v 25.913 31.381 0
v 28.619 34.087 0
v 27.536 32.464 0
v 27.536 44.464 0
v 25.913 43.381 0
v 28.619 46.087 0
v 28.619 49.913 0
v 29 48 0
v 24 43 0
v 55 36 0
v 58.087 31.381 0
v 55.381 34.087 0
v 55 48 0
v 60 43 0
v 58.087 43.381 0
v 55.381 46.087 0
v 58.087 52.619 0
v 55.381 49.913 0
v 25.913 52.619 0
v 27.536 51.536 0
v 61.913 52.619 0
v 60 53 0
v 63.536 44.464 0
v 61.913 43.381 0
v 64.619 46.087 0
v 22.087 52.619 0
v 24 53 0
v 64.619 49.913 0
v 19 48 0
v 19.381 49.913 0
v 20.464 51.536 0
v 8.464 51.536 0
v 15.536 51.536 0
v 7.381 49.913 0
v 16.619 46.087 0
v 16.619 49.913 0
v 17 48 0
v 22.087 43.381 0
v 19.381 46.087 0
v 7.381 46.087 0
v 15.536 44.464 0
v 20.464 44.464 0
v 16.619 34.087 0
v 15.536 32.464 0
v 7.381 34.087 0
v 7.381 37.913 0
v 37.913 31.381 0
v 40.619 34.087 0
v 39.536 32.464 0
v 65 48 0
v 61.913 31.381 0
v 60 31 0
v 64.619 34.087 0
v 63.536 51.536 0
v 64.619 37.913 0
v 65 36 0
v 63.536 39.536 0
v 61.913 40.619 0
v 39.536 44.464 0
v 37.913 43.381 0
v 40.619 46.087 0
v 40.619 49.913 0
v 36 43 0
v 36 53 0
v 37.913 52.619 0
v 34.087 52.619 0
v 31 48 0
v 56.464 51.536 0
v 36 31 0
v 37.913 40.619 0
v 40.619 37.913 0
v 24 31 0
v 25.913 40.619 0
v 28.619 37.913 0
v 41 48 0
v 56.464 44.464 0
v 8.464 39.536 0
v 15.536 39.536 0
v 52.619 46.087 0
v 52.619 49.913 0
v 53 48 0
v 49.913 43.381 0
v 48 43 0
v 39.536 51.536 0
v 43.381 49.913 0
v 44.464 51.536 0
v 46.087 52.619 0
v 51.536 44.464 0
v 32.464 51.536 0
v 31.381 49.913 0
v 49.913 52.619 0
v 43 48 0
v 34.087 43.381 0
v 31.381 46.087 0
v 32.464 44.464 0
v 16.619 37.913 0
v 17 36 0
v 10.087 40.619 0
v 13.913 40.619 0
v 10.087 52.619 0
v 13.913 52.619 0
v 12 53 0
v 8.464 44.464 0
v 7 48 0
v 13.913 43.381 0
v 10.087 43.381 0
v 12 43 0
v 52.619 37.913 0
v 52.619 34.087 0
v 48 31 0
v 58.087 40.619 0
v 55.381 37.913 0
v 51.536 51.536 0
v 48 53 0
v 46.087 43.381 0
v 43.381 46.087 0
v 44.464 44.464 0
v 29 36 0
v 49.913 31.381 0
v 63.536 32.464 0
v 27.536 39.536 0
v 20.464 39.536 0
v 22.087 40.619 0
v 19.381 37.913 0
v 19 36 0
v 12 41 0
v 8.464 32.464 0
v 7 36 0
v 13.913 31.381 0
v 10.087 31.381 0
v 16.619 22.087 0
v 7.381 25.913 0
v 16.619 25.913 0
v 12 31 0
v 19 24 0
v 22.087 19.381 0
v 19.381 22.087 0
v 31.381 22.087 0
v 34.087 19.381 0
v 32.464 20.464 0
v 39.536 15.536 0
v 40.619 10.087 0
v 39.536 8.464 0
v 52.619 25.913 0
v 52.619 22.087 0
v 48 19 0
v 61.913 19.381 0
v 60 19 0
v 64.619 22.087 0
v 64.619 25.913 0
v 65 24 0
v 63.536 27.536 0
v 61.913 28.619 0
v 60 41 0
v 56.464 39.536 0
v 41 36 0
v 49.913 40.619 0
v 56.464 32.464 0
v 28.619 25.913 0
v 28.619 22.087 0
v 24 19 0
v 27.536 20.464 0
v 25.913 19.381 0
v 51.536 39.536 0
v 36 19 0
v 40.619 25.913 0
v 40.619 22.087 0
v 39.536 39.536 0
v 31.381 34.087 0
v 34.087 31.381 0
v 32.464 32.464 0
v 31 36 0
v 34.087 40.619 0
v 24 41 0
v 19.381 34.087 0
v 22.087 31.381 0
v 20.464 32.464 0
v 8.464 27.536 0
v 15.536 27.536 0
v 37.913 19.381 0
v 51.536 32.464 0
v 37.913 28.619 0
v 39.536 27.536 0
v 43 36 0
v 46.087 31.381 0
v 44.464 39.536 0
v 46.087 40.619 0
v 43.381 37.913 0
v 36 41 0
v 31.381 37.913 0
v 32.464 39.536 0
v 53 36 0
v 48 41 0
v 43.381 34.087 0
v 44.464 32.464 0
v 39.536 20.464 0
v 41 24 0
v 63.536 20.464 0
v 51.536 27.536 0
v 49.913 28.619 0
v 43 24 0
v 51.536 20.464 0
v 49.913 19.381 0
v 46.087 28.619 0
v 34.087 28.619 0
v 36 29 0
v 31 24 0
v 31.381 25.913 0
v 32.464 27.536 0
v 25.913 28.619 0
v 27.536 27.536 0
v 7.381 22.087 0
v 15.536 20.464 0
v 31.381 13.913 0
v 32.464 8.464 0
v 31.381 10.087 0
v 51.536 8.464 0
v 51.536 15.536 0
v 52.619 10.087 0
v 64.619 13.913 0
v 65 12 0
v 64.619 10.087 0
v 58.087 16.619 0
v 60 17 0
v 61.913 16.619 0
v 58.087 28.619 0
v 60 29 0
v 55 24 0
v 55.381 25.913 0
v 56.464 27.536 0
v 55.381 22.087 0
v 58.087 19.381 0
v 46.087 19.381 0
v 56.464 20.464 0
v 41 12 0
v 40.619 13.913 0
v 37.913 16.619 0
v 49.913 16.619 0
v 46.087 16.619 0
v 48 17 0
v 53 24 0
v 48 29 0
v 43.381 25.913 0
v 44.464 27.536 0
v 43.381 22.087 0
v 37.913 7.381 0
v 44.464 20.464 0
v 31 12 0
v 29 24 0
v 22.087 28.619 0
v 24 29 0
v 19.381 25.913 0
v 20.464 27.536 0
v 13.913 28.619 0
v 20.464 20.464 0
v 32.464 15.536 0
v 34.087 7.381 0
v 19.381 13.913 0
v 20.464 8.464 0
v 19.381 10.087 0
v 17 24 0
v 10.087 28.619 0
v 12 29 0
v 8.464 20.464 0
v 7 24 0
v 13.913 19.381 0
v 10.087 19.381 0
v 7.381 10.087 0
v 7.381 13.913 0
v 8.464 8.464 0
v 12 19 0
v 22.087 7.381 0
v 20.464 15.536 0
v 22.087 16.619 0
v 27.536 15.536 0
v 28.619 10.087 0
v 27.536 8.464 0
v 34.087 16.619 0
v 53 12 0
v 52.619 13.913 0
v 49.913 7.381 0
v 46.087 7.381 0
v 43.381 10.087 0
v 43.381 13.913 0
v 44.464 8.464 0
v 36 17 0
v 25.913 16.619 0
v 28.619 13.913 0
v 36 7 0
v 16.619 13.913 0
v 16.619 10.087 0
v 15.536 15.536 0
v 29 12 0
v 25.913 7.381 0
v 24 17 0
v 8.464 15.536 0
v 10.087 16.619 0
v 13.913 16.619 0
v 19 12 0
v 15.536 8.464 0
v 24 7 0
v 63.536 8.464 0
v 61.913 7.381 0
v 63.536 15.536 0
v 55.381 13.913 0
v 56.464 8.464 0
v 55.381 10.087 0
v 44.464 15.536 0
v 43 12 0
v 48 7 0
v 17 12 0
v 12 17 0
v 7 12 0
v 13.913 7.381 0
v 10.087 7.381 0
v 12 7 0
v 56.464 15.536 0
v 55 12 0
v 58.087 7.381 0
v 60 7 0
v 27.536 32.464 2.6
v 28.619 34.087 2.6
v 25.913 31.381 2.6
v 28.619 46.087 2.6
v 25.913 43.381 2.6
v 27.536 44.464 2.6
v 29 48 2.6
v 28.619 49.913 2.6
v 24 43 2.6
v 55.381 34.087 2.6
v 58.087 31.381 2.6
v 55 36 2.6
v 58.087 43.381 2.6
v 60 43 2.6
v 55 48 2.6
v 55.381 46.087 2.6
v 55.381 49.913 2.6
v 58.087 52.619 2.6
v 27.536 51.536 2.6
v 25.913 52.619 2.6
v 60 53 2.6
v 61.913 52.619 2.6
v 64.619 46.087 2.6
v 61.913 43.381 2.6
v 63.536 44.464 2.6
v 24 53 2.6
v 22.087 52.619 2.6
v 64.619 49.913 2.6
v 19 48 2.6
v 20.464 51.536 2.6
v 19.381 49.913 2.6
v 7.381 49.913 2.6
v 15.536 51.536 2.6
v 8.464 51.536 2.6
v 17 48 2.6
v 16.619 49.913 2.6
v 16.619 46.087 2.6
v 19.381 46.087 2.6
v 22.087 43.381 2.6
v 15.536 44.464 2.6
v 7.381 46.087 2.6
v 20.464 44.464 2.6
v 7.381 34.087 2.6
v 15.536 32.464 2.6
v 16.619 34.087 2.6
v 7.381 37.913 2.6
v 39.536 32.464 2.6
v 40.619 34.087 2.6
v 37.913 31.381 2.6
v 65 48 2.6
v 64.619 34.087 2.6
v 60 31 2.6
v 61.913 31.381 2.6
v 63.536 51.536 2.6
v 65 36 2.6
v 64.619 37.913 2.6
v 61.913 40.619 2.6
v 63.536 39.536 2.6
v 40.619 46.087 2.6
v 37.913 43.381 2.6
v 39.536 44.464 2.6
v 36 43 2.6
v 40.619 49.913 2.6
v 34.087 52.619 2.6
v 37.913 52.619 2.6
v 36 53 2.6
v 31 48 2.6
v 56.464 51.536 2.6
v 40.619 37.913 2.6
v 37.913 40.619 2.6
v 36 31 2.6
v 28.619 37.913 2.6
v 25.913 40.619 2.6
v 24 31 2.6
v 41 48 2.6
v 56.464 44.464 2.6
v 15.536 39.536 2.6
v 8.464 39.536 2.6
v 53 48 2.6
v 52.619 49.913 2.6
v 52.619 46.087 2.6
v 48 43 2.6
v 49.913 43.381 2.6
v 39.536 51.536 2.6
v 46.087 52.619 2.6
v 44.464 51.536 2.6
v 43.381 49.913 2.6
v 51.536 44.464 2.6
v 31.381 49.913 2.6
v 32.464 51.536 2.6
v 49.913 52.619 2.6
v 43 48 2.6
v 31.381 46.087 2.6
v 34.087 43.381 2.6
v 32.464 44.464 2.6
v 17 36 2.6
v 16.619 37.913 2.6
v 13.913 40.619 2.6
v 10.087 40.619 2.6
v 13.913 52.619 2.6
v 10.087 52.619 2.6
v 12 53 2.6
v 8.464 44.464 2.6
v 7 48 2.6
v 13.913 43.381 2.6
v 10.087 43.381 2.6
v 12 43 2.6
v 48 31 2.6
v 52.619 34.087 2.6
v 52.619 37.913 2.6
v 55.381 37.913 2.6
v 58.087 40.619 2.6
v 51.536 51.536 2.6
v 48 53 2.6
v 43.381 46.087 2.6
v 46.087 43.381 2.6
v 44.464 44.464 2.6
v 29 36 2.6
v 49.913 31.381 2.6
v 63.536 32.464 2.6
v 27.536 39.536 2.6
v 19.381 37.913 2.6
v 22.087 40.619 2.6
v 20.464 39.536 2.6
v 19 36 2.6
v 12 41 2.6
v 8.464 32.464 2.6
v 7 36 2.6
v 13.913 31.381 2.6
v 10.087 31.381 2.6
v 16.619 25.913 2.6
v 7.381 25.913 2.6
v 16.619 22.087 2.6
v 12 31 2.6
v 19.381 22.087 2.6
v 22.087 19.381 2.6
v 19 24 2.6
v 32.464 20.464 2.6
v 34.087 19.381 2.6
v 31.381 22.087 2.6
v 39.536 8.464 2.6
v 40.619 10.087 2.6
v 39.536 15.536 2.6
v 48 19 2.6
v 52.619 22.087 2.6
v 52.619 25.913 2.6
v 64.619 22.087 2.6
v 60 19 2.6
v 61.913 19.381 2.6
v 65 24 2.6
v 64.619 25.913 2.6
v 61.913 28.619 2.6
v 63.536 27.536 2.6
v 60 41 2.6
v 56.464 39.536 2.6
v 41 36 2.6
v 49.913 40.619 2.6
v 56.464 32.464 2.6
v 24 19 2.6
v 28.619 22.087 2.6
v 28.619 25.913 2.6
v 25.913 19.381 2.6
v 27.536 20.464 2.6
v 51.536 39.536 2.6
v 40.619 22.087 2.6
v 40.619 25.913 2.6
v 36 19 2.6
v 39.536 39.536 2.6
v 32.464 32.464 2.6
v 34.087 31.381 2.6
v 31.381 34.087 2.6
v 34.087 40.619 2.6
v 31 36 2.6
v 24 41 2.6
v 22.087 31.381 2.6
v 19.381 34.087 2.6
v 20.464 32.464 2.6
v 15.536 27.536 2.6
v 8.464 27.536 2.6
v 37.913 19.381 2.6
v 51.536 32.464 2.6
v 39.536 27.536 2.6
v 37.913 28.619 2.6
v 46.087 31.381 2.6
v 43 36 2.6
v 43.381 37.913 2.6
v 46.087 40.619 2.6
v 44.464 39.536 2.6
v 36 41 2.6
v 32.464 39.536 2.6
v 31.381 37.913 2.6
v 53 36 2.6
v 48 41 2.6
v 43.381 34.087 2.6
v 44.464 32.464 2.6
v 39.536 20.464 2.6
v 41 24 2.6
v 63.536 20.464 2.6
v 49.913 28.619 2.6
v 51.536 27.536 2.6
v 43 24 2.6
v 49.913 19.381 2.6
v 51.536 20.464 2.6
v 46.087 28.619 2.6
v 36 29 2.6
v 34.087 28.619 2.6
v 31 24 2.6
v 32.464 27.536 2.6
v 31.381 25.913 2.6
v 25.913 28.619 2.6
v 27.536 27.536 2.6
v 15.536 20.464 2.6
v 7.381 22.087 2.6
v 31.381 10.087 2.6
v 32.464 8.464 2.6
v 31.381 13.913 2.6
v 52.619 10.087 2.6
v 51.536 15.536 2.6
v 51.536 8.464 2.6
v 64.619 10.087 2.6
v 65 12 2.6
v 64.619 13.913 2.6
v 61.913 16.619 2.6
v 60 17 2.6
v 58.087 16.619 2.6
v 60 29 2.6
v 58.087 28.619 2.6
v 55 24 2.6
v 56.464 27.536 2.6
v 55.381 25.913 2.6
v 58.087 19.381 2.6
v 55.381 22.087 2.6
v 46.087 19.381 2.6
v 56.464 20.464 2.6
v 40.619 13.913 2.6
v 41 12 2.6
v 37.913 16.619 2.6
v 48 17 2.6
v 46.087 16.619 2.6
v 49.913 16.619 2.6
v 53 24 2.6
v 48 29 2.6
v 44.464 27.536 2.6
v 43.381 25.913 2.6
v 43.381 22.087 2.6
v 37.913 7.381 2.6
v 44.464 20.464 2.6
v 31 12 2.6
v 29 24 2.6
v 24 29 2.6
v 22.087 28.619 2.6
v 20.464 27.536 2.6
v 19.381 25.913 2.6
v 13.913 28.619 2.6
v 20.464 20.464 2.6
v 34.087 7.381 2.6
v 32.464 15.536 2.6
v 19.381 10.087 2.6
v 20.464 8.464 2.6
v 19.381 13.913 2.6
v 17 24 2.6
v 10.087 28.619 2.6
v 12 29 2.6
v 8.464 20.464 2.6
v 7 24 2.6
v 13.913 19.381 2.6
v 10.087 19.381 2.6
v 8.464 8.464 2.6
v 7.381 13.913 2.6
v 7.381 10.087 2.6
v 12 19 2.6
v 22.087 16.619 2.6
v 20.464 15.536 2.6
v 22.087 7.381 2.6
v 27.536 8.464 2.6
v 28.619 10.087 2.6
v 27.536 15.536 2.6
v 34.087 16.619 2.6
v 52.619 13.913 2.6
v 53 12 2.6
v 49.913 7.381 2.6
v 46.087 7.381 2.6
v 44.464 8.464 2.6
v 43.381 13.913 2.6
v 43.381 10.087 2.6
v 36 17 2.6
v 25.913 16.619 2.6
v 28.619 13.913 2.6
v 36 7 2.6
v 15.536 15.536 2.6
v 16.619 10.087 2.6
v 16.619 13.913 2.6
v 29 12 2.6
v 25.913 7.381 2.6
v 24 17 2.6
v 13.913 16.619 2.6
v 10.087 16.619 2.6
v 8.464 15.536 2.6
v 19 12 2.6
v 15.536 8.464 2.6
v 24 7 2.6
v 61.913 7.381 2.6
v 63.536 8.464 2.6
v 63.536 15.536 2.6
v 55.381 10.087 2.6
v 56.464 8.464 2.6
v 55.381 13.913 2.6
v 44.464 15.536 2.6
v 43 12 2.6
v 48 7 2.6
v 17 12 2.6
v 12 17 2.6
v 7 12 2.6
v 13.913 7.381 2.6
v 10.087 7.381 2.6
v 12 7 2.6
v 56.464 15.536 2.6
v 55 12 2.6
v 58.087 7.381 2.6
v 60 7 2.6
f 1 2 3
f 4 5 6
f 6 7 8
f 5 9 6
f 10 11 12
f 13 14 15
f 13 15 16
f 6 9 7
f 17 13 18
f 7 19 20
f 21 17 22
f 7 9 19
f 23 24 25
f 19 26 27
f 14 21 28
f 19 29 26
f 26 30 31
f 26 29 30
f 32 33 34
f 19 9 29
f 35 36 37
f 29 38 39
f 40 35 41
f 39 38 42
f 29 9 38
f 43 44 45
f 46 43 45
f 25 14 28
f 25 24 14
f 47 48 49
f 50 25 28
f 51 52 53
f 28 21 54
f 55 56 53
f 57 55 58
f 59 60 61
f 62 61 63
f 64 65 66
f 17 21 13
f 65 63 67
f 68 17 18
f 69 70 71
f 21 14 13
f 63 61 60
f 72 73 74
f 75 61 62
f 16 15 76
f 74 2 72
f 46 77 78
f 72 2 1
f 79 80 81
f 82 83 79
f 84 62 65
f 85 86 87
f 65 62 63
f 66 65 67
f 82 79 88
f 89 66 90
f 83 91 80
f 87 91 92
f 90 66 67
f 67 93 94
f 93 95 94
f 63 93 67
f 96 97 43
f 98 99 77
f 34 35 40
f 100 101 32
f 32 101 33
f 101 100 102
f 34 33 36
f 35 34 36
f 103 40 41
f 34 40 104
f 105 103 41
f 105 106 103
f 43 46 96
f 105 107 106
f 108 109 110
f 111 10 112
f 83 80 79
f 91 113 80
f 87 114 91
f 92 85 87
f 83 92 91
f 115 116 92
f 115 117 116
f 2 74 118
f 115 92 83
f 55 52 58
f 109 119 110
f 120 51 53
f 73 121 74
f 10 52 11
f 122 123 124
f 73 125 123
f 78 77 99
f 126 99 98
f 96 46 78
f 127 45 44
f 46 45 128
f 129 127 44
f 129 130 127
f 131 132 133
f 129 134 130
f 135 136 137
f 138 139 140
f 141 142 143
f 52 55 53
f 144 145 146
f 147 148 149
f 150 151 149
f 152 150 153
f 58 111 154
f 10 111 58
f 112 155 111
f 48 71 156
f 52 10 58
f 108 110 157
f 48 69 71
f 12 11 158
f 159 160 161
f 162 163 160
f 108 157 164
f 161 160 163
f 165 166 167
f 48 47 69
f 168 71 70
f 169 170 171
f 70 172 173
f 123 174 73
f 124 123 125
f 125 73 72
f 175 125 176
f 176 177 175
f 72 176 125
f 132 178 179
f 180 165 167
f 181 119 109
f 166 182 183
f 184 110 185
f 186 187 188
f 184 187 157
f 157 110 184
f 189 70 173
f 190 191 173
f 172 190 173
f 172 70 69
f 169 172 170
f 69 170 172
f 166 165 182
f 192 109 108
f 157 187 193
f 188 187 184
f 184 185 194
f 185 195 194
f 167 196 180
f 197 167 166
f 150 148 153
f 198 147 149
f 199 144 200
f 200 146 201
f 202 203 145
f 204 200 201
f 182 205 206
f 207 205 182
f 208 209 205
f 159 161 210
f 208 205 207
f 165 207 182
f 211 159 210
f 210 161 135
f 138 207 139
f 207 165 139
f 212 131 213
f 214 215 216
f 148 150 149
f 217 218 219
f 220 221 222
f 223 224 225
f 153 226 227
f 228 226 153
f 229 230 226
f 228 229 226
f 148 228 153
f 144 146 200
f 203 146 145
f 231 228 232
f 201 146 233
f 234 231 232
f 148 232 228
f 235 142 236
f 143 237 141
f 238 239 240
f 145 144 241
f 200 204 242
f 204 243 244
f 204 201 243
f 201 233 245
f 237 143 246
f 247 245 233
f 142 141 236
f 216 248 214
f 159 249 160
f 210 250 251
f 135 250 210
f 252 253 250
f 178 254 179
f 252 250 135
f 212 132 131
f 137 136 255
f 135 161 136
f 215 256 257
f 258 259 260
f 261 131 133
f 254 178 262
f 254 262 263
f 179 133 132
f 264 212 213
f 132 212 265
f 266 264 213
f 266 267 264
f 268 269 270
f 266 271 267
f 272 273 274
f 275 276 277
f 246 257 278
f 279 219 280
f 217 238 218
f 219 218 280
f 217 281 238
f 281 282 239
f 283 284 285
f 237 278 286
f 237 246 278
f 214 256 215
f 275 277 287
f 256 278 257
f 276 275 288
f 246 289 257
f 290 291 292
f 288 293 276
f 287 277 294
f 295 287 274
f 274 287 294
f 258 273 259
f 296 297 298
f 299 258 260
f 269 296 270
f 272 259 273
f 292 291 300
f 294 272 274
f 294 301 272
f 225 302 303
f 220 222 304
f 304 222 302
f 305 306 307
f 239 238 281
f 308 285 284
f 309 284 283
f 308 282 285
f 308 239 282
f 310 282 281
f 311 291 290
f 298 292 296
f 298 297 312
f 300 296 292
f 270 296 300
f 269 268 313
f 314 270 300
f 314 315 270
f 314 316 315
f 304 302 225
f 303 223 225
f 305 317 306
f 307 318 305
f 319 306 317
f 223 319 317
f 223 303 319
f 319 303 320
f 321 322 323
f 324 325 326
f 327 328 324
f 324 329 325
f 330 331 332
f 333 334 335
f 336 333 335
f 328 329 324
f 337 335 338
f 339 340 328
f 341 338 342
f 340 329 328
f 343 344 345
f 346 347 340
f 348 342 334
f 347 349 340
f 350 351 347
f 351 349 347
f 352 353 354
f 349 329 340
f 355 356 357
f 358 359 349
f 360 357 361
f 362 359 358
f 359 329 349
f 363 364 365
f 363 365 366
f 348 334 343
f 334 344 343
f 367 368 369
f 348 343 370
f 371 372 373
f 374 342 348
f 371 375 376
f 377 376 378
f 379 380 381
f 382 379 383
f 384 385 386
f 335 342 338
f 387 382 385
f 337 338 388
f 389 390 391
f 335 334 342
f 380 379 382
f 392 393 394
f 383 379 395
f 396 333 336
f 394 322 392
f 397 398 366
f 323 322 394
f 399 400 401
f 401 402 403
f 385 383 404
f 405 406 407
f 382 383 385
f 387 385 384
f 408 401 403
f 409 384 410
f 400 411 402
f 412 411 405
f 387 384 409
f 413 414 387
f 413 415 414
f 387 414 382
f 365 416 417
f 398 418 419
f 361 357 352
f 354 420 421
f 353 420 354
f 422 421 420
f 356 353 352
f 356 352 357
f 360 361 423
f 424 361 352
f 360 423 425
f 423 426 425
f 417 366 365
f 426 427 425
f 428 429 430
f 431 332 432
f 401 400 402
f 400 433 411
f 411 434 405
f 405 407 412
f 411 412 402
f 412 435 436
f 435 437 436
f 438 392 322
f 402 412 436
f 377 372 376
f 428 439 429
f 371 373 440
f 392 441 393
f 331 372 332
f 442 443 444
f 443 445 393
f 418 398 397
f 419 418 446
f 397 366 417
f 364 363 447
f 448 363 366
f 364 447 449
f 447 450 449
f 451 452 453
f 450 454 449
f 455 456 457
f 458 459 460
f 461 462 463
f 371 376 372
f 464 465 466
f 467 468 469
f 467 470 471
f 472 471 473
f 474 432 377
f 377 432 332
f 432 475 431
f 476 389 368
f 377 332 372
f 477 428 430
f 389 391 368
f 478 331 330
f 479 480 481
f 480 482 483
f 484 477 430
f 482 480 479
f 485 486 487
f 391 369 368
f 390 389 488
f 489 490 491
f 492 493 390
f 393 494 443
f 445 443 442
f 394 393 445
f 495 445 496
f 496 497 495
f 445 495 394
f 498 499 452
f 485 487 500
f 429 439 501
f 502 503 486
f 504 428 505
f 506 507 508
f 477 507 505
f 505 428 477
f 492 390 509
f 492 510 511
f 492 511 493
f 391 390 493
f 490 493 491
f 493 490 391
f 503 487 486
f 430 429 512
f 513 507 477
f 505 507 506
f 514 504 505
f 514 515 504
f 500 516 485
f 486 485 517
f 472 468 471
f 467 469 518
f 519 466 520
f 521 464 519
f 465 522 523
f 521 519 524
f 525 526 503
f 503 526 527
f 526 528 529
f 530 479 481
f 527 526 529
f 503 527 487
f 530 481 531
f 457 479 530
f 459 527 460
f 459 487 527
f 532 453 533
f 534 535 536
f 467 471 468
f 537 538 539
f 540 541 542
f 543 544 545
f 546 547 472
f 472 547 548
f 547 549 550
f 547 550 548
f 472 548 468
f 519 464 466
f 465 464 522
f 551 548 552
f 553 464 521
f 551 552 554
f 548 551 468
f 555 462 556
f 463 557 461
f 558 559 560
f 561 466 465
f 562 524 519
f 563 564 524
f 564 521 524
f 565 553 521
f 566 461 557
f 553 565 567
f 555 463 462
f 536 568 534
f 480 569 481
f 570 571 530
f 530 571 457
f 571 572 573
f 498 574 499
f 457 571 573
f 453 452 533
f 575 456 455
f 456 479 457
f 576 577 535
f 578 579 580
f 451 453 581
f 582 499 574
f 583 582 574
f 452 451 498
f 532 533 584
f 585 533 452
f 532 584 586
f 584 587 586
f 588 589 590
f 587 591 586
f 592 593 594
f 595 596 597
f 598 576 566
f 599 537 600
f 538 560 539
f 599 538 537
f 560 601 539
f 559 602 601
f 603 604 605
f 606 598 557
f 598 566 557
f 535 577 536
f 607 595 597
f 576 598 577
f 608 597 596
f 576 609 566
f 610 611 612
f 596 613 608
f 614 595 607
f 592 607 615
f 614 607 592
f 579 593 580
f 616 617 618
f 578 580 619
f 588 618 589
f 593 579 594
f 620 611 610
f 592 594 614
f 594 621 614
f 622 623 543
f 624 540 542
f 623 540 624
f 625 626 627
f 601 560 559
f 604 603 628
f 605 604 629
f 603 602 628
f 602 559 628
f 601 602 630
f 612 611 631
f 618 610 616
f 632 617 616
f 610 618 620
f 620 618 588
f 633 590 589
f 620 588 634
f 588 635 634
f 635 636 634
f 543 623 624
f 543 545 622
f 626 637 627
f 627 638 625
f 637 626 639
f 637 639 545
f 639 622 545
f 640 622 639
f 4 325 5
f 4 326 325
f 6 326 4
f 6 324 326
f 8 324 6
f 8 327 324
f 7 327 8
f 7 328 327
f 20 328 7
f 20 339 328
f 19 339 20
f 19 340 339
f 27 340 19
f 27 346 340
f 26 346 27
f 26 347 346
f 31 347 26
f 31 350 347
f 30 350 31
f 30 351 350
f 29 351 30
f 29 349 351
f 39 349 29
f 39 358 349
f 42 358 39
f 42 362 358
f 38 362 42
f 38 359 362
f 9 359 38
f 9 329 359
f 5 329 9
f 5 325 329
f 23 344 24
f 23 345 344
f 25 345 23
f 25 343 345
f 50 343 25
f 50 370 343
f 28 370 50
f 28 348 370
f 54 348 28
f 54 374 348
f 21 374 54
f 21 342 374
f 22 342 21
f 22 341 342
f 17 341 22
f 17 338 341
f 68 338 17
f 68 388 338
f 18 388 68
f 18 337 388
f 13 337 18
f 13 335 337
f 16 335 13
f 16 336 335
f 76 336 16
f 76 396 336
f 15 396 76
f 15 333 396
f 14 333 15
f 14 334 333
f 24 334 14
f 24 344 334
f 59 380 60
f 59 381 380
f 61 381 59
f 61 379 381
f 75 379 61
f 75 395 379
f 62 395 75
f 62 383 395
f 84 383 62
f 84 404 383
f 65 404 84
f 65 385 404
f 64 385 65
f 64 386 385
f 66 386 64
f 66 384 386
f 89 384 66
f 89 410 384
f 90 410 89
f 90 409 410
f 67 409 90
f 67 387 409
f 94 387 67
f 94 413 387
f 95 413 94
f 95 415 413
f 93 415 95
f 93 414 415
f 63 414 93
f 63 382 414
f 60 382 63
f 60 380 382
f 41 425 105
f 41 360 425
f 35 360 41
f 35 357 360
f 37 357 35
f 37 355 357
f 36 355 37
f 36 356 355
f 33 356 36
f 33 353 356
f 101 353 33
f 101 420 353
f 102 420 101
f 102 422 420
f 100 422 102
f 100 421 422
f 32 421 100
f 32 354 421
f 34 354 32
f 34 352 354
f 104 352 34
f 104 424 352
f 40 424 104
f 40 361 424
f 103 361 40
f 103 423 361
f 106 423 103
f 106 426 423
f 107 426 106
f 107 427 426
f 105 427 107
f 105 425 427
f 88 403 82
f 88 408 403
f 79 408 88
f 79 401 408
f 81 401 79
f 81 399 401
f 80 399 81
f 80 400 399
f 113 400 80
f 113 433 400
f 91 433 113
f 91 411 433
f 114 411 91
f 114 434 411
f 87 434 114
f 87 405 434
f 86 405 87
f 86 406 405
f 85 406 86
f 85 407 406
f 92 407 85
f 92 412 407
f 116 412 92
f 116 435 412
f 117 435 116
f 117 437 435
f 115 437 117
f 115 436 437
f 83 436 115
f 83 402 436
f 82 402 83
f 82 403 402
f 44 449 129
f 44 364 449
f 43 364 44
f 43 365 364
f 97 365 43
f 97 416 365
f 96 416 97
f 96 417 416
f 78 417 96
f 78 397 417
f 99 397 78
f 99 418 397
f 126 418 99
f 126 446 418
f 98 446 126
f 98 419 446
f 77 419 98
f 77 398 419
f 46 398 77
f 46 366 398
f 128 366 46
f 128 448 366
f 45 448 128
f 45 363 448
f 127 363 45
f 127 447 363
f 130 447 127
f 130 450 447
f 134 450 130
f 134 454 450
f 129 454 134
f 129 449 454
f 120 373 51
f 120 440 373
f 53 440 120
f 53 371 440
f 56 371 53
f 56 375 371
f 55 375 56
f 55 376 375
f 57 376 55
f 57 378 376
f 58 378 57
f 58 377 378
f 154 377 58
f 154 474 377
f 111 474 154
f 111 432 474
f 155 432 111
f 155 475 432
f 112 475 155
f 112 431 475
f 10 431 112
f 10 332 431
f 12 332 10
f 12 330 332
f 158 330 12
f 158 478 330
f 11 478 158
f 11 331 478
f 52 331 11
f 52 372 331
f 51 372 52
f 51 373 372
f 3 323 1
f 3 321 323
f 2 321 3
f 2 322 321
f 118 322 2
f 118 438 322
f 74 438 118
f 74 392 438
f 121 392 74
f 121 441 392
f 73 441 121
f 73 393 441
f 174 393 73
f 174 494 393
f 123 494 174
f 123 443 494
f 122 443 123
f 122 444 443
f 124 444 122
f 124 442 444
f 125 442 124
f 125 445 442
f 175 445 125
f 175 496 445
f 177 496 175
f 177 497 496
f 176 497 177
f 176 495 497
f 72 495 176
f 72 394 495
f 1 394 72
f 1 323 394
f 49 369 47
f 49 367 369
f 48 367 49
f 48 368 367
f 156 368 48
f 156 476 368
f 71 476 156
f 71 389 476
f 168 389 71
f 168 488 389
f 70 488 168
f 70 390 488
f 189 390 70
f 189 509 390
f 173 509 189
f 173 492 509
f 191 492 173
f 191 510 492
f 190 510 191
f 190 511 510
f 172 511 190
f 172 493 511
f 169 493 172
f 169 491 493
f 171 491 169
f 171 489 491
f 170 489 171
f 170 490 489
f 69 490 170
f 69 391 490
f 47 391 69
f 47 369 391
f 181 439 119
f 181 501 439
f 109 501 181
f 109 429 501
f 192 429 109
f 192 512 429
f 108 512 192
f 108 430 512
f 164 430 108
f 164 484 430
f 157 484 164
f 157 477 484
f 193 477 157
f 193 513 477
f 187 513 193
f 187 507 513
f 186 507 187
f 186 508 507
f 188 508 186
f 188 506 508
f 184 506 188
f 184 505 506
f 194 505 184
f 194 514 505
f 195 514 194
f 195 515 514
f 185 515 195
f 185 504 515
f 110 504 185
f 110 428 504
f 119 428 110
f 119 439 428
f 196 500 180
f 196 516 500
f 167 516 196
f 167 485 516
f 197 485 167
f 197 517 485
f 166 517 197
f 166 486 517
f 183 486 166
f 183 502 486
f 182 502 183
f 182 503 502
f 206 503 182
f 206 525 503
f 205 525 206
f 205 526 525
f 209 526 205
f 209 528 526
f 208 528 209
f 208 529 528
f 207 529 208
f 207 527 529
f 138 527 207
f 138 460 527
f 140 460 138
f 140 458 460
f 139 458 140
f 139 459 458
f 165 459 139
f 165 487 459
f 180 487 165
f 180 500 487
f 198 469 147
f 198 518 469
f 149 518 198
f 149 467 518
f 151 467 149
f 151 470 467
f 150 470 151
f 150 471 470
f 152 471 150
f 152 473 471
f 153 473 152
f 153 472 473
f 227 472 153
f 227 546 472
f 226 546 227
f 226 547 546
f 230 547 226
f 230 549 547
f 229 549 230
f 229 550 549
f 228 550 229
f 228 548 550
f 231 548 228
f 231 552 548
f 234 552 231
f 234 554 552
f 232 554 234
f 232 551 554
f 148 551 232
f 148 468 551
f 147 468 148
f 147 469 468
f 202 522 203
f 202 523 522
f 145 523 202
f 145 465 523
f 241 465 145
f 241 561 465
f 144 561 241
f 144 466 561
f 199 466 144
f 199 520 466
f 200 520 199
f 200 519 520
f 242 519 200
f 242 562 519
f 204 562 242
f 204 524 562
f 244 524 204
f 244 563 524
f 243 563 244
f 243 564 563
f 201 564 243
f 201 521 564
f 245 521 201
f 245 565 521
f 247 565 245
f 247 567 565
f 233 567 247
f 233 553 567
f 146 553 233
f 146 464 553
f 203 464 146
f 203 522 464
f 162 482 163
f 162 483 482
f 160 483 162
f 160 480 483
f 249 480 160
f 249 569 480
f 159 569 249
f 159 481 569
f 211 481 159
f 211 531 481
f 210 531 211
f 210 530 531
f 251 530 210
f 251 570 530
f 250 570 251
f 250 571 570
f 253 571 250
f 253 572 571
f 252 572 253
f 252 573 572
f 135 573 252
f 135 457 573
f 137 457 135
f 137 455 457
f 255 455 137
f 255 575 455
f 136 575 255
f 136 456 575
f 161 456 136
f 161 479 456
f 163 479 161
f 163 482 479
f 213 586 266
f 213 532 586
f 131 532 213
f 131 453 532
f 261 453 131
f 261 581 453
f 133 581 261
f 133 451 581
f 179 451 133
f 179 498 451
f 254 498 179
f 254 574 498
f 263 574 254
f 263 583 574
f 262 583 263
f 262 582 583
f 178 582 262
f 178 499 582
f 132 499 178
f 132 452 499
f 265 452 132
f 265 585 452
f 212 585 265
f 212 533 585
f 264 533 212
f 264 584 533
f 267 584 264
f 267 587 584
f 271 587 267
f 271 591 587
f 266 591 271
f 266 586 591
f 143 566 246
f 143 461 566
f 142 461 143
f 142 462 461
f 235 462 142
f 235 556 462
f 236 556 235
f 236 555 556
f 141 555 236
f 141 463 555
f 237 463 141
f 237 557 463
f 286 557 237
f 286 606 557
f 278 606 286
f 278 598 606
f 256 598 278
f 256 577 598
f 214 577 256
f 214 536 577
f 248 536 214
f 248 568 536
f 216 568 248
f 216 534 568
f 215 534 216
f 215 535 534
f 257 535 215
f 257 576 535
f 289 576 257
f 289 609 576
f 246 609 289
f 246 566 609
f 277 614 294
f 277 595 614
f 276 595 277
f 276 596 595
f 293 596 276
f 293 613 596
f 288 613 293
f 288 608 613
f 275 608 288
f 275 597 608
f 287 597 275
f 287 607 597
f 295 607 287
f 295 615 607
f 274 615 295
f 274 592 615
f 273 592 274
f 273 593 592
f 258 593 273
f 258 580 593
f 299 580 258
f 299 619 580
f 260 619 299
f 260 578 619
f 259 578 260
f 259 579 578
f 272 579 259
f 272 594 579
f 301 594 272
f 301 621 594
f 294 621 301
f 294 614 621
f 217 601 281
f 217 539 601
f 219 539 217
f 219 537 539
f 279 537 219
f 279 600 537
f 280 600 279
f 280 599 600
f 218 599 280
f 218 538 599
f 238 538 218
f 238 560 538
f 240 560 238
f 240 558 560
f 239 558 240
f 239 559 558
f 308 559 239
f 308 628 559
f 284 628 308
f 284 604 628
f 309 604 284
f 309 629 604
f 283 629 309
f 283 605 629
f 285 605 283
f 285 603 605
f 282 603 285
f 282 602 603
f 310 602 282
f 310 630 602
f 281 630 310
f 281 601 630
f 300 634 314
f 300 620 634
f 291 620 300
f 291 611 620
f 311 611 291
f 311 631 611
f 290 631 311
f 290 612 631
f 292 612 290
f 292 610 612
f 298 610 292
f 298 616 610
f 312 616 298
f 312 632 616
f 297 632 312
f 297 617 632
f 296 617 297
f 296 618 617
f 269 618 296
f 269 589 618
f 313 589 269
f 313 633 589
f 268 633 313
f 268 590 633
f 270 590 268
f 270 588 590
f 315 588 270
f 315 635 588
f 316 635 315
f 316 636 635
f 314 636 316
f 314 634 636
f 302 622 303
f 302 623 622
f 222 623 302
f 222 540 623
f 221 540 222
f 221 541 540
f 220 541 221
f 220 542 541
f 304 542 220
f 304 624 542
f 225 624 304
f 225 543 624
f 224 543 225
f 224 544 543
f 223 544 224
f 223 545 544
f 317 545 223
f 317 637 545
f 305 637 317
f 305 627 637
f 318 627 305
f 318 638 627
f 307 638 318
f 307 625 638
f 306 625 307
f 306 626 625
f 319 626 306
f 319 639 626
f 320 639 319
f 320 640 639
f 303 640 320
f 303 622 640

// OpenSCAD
brikkedia = 10;
mellomrom = 2;
brikker_x = 5;
brikker_y = 4;
box_x=(brikkedia+mellomrom)*(brikker_x+1)*2;
box_y=(brikkedia+mellomrom)*(brikker_y+1)*2;
bord=0.2;
hoyde=2.6;
d=3;

if (d == 2) {
    translate([0,0]) {
        difference() {
            square([box_x,box_y]);
            translate([bord,bord]) {
                square([box_x-bord*2,box_y-bord*2]);
            }
        }
    }
}

if (d == 2) {
    translate([(brikkedia+mellomrom),(brikkedia+mellomrom)*2]) {
        for (x=[0:brikkedia+mellomrom:(brikkedia+mellomrom)*(brikker_x-1)]) {
            for (y=[0:brikkedia+mellomrom:(brikkedia+mellomrom)*(brikker_y-1)]) {
                //echo(str("x er ", x))
    //            echo (str("x er ",x," og y er ",y));;
                translate([x*2,y*2]) {
                    circle(d=brikkedia);       
                }
            }
        }
    }
} else if (d == 3) {
    linear_extrude(hoyde) {
        translate([(brikkedia+mellomrom),(brikkedia+mellomrom)]) {
            for (x=[0:brikkedia+mellomrom:(brikkedia+mellomrom)*(brikker_x-1)]) {
                for (y=[0:brikkedia+mellomrom:(brikkedia+mellomrom)*(brikker_y-1)]) {
                    //echo(str("x er ", x))
        //            echo (str("x er ",x," og y er ",y));;
                    translate([x,y]) {
                        circle(d=brikkedia);       
                    }
                }
            }
        }
    }
}
